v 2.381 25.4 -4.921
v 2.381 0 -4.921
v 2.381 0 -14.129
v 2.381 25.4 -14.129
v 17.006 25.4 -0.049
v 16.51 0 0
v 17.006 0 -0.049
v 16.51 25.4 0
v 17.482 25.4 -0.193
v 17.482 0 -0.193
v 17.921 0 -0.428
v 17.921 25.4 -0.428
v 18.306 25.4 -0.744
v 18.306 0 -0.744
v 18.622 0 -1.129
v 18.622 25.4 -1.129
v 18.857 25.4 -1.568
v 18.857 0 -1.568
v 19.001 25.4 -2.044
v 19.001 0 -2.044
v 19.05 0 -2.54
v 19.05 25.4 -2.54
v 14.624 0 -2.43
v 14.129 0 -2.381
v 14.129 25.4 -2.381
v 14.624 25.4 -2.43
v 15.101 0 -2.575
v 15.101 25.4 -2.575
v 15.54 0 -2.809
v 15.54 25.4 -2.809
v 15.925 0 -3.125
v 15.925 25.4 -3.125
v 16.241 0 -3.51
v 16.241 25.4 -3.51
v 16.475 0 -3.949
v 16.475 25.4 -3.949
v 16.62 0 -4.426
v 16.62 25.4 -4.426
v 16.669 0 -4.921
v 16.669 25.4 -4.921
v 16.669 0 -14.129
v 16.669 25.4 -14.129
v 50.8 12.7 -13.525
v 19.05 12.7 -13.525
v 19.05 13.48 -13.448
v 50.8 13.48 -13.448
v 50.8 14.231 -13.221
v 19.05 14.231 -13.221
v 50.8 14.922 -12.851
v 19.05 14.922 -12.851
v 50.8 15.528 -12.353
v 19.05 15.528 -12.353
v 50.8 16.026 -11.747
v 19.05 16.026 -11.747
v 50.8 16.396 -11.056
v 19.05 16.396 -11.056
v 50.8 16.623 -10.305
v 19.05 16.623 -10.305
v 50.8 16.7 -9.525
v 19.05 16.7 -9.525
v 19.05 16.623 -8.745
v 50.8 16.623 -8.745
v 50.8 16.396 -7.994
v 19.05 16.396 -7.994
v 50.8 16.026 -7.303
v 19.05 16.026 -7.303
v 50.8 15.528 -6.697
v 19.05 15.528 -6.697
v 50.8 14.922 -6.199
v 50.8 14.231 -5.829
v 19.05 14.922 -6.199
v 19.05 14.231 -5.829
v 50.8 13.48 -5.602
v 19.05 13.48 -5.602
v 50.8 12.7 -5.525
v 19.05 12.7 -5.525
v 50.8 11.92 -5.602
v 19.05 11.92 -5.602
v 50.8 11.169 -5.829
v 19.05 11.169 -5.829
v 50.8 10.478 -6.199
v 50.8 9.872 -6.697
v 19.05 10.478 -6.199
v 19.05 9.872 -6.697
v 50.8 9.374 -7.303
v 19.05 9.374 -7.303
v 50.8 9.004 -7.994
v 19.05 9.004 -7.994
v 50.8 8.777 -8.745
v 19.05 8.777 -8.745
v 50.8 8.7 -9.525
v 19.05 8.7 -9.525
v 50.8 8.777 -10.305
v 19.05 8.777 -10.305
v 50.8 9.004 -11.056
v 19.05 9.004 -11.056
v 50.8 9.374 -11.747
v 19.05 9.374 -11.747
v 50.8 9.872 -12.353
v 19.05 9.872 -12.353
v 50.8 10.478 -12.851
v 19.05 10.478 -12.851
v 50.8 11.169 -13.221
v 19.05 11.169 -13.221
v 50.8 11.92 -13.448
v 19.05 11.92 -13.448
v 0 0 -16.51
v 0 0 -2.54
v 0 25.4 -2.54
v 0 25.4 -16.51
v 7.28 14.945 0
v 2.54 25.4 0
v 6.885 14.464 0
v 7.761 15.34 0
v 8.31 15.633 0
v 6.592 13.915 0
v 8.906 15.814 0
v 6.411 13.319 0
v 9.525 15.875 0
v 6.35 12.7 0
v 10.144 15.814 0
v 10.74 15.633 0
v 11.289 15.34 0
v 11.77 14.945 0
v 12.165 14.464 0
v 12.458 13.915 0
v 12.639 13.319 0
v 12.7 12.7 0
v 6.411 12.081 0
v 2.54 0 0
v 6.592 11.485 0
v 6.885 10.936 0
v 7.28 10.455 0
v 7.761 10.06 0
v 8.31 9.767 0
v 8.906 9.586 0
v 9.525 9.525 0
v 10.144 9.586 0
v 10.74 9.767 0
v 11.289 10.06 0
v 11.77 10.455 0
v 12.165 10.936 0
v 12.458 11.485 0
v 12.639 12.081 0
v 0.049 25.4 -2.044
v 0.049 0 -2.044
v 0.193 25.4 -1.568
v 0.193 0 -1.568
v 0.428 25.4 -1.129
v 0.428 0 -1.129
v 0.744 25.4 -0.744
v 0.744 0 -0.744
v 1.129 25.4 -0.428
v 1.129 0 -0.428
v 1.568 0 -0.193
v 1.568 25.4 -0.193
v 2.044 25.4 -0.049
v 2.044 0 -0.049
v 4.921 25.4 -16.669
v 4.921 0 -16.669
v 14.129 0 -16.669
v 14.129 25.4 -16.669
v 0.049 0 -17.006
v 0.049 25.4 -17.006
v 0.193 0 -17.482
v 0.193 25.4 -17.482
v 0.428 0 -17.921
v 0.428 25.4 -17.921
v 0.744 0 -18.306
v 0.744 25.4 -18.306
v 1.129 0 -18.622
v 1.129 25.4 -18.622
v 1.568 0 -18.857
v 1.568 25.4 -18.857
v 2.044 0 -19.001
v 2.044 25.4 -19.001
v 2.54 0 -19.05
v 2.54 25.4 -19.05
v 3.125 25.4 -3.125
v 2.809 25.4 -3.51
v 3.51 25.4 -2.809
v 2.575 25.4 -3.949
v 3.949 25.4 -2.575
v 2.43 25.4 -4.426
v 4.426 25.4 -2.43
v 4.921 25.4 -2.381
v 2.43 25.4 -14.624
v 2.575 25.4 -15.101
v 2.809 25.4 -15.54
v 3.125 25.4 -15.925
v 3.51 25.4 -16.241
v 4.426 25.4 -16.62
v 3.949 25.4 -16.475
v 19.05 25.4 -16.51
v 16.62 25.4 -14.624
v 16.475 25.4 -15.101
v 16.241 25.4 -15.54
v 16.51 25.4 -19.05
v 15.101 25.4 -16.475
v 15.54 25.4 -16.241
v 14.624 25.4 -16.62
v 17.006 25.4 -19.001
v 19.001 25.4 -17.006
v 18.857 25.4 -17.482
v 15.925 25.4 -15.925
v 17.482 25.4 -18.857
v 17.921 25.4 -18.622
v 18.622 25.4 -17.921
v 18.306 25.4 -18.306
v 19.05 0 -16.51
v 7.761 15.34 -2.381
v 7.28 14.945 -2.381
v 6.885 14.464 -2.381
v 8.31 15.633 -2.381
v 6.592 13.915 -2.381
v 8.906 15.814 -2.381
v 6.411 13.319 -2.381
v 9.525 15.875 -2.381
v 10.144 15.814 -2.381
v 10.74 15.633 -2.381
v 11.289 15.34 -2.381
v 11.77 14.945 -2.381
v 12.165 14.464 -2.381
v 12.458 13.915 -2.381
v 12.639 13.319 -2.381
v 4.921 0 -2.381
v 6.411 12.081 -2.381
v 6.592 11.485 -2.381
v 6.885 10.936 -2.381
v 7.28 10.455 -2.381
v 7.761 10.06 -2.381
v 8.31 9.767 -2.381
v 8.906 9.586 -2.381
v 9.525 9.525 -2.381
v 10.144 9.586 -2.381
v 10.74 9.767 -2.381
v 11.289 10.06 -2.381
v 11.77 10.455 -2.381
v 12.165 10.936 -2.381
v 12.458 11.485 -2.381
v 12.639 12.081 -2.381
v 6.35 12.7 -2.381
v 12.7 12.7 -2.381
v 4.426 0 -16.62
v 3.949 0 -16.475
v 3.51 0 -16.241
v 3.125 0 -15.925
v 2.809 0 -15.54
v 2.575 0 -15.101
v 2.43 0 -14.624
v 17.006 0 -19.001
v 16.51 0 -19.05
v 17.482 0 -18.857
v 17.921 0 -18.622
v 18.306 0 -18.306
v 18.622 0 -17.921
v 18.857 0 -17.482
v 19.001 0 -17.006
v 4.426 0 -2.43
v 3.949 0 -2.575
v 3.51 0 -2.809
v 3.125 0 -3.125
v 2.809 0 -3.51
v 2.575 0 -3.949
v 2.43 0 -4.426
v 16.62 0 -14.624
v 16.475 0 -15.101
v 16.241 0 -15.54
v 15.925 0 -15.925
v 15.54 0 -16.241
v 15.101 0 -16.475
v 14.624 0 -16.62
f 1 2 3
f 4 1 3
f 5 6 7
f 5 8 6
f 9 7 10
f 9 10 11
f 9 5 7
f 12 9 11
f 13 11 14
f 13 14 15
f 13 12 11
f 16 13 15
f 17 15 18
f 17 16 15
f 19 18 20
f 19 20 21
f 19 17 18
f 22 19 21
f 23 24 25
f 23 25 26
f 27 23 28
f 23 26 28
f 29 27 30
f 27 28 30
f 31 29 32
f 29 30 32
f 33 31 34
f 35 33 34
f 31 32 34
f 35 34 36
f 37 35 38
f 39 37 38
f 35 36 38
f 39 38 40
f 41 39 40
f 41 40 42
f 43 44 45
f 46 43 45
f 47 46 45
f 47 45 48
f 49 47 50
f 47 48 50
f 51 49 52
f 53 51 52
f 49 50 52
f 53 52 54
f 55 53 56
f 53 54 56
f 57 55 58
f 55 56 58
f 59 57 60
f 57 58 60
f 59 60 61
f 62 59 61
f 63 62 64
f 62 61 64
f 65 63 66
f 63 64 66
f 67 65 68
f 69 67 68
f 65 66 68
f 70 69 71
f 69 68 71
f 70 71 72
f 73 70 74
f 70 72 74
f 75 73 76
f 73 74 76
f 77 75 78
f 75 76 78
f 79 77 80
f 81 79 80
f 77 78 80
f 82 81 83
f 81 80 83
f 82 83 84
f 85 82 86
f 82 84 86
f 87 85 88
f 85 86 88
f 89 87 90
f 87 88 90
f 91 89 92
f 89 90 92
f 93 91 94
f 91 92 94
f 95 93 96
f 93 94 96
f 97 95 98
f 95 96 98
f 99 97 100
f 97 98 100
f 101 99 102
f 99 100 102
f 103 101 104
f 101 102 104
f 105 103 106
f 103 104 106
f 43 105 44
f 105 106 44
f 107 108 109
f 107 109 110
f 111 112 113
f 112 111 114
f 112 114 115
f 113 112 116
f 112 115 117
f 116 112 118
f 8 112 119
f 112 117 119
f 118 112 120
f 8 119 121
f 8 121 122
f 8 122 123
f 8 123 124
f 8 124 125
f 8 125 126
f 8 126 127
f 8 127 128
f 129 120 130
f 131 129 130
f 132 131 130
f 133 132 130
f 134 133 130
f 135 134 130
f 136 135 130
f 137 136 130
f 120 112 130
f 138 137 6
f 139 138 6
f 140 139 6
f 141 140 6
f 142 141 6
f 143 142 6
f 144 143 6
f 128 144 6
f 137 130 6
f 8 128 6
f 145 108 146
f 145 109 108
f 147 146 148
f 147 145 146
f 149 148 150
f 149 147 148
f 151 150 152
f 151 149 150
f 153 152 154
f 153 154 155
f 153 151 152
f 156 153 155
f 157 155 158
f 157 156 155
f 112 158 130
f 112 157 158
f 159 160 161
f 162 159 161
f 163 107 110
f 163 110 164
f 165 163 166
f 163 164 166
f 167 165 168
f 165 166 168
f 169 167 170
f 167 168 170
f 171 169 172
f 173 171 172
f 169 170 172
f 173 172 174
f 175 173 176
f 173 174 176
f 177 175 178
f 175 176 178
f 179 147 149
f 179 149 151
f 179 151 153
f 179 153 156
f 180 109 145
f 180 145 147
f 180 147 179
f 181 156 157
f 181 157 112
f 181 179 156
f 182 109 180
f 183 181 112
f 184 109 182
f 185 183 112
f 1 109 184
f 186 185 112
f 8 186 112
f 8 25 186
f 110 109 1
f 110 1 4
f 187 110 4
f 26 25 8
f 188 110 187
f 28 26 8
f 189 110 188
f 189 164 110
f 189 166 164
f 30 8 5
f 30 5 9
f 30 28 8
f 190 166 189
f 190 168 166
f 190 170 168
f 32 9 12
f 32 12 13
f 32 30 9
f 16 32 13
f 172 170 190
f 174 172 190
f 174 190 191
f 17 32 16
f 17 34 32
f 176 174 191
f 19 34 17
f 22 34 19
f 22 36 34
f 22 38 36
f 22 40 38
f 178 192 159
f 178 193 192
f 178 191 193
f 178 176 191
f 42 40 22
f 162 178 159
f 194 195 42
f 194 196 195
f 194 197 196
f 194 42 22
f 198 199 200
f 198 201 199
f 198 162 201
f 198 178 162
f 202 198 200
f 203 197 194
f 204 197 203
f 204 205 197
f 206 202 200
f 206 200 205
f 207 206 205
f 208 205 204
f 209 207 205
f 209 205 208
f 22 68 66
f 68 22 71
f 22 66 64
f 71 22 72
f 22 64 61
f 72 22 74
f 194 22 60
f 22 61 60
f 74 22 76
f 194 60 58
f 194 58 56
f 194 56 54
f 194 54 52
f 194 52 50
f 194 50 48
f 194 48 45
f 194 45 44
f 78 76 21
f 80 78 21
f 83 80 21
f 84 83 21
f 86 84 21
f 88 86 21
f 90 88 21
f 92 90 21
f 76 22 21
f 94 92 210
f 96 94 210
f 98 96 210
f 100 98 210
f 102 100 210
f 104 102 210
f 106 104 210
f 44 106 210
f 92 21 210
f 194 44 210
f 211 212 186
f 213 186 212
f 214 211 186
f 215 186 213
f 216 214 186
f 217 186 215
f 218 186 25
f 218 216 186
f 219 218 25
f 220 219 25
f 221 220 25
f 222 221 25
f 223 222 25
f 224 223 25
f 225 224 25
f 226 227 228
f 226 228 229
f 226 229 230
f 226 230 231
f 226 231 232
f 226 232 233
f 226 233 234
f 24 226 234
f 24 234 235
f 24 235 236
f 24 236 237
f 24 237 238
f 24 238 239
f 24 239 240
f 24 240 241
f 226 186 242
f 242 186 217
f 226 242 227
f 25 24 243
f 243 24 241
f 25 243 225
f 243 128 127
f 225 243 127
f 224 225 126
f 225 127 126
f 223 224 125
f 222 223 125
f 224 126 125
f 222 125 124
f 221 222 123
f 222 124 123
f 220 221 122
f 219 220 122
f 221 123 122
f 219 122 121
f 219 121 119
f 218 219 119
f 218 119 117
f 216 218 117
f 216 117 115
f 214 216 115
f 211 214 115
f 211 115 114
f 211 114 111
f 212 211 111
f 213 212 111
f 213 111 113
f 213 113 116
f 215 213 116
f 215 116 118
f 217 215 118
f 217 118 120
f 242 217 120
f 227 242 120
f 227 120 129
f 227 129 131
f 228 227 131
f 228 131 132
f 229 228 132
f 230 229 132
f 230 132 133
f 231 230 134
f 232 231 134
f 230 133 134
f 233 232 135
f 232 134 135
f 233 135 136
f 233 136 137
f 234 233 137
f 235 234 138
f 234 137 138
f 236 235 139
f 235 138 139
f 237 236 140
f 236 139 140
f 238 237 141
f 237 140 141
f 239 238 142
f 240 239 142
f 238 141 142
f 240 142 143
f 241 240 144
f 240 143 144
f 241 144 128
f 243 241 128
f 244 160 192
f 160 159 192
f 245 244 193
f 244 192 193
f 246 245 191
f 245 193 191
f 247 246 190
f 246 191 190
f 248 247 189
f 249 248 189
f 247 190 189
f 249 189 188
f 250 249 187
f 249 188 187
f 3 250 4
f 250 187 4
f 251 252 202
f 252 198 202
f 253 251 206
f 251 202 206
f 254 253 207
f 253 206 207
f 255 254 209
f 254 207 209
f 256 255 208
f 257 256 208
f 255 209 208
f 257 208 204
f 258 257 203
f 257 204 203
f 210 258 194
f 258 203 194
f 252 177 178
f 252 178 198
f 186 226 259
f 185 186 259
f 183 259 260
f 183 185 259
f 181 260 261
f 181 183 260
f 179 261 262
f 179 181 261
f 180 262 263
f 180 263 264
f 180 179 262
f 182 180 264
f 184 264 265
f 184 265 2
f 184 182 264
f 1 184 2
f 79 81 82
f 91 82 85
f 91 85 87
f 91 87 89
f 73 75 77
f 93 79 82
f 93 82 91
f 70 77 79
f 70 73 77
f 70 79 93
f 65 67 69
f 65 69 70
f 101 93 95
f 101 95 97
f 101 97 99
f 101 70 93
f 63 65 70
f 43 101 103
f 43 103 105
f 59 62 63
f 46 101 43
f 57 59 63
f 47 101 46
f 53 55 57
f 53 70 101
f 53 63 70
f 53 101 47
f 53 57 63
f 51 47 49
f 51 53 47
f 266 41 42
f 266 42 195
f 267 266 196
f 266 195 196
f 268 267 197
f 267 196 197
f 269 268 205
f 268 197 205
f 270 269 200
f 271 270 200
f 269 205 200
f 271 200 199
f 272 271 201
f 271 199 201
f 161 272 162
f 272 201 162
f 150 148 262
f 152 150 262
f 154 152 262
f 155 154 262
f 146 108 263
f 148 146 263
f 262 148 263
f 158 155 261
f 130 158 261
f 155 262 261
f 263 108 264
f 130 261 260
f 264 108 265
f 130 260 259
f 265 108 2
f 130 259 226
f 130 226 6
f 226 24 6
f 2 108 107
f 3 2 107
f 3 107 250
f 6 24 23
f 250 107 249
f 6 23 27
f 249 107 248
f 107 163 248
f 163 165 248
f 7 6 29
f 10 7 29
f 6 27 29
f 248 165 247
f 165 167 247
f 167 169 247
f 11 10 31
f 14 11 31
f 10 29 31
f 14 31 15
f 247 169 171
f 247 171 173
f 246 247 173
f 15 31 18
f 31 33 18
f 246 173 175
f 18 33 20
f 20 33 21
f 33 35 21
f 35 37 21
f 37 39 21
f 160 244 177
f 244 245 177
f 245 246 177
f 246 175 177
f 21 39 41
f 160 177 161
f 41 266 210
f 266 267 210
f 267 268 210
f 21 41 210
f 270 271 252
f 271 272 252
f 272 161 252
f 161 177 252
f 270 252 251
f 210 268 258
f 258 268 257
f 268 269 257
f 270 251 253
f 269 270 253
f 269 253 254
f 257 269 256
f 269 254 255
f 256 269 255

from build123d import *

# Parameters (mm, degrees)
SKETCH1_W           = 19.05
SKETCH1_H           = 19.05
SKETCH1_W_2         = 14.2875
SKETCH1_H_2         = 14.2875
BOSS_EXTRUDE1_DEPTH = 25.4
CUT_EXTRUDE1_REACH  = 21.05
SKETCH2_R           = 3.175
SKETCH3_R           = 4
BOSS_EXTRUDE2_DEPTH = 31.75
FILLET1_R           = 2.54


with BuildPart() as part:
    # Sketch1 → Boss-Extrude1 (new body)
    with BuildSketch(Plane(origin=(0, 0, 0), x_dir=(1, 0, 0), z_dir=(0, 1, 0))):
        with Locations((9.525, 9.525)):
            Rectangle(SKETCH1_W, SKETCH1_H)
        with Locations((9.525, 9.525)):
            Rectangle(SKETCH1_W_2, SKETCH1_H_2, mode=Mode.SUBTRACT)
    extrude(amount=BOSS_EXTRUDE1_DEPTH)

    # Sketch2 → Cut-Extrude1 (cut, up to next)
    with BuildSketch(Plane.XY, mode=Mode.PRIVATE) as cut_extrude1_sk1:
        with Locations((9.525, 12.7)):
            Circle(SKETCH2_R)
    cut_extrude1_tool1 = extrude(cut_extrude1_sk1.sketch, amount=-CUT_EXTRUDE1_REACH, mode=Mode.PRIVATE) & part.part
    add(cut_extrude1_tool1.solids().sort_by_distance((9.525, 12.7, 0))[0], mode=Mode.SUBTRACT)

    # Sketch3 → Boss-Extrude2 (add)
    with BuildSketch(Plane(origin=(19.05, 0, 0), x_dir=(0, 0, -1), z_dir=(1, 0, 0))):
        with Locations((9.525, 12.7)):
            Circle(SKETCH3_R)
    extrude(amount=BOSS_EXTRUDE2_DEPTH)

    # Fillet1
    fillet1_edges = [part.edges().sort_by_distance(p)[0] for p in [
        (2.38125, 12.7, -16.66875),
        (2.38125, 12.7, -2.38125),
        (16.66875, 12.7, -2.38125),
        (16.66875, 12.7, -16.66875),
        (0, 12.7, -19.05),
        (19.05, 12.7, -19.05),
        (19.05, 12.7, 0),
        (0, 12.7, 0),
    ]]
    fillet(fillet1_edges, radius=FILLET1_R)


solid = part.part
